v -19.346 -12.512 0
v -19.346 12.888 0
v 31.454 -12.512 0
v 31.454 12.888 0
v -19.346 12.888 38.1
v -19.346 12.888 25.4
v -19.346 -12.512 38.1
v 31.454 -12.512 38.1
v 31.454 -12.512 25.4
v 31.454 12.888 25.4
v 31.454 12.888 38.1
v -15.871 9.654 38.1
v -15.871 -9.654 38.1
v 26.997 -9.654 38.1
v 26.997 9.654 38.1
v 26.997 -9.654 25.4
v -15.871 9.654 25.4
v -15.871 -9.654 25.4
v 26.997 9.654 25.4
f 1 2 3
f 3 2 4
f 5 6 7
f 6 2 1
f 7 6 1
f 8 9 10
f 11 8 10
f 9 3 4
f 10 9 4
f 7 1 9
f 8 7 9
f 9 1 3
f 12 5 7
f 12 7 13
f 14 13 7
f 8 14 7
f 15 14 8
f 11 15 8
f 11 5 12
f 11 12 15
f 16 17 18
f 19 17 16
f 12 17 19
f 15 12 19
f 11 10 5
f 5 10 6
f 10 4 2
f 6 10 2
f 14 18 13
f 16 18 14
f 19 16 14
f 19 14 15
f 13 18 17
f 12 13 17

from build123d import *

# Parameters (mm, degrees)
F0_W     = 50.8
F0_H     = 25.4
F1_DEPTH = 25.4
F2_W     = 3.4749715865
F2_H     = 3.2341817119
F2_W_2   = 42.8683459759
F2_H_2   = 19.3071160465
F2_W_3   = 4.4566824377
F2_H_3   = 2.8587022416
F3_DEPTH = 12.7


with BuildPart() as f1:
    # F0 (on Top) → F1 (new body)
    with BuildSketch(Plane.XY):
        with Locations((6.0539245605, 0.1877397351)):
            Rectangle(F0_W, F0_H)
    extrude(amount=F1_DEPTH)

    # F2 (on face) → F3 (join)
    with BuildSketch(Plane.XY.offset(25.4)):
        with Locations((-17.6085896462, 11.2706488792)):
            Rectangle(F2_W, F2_H)
        with Locations((5.563069135, 11.2706488792)):
            Rectangle(F2_W_2, F2_H)
        with Locations((-17.6085896462, 0)):
            Rectangle(F2_W, F2_H_2)
        with Locations((29.2255833417, 11.2706488792)):
            Rectangle(F2_W_3, F2_H)
        with Locations((-17.6085896462, -11.0829091441)):
            Rectangle(F2_W, F2_H_3)
        with Locations((29.2255833417, 0)):
            Rectangle(F2_W_3, F2_H_2)
        with Locations((5.563069135, -11.0829091441)):
            Rectangle(F2_W_2, F2_H_3)
        with Locations((29.2255833417, -11.0829091441)):
            Rectangle(F2_W_3, F2_H_3)
    extrude(amount=F3_DEPTH)


solid = f1.part
